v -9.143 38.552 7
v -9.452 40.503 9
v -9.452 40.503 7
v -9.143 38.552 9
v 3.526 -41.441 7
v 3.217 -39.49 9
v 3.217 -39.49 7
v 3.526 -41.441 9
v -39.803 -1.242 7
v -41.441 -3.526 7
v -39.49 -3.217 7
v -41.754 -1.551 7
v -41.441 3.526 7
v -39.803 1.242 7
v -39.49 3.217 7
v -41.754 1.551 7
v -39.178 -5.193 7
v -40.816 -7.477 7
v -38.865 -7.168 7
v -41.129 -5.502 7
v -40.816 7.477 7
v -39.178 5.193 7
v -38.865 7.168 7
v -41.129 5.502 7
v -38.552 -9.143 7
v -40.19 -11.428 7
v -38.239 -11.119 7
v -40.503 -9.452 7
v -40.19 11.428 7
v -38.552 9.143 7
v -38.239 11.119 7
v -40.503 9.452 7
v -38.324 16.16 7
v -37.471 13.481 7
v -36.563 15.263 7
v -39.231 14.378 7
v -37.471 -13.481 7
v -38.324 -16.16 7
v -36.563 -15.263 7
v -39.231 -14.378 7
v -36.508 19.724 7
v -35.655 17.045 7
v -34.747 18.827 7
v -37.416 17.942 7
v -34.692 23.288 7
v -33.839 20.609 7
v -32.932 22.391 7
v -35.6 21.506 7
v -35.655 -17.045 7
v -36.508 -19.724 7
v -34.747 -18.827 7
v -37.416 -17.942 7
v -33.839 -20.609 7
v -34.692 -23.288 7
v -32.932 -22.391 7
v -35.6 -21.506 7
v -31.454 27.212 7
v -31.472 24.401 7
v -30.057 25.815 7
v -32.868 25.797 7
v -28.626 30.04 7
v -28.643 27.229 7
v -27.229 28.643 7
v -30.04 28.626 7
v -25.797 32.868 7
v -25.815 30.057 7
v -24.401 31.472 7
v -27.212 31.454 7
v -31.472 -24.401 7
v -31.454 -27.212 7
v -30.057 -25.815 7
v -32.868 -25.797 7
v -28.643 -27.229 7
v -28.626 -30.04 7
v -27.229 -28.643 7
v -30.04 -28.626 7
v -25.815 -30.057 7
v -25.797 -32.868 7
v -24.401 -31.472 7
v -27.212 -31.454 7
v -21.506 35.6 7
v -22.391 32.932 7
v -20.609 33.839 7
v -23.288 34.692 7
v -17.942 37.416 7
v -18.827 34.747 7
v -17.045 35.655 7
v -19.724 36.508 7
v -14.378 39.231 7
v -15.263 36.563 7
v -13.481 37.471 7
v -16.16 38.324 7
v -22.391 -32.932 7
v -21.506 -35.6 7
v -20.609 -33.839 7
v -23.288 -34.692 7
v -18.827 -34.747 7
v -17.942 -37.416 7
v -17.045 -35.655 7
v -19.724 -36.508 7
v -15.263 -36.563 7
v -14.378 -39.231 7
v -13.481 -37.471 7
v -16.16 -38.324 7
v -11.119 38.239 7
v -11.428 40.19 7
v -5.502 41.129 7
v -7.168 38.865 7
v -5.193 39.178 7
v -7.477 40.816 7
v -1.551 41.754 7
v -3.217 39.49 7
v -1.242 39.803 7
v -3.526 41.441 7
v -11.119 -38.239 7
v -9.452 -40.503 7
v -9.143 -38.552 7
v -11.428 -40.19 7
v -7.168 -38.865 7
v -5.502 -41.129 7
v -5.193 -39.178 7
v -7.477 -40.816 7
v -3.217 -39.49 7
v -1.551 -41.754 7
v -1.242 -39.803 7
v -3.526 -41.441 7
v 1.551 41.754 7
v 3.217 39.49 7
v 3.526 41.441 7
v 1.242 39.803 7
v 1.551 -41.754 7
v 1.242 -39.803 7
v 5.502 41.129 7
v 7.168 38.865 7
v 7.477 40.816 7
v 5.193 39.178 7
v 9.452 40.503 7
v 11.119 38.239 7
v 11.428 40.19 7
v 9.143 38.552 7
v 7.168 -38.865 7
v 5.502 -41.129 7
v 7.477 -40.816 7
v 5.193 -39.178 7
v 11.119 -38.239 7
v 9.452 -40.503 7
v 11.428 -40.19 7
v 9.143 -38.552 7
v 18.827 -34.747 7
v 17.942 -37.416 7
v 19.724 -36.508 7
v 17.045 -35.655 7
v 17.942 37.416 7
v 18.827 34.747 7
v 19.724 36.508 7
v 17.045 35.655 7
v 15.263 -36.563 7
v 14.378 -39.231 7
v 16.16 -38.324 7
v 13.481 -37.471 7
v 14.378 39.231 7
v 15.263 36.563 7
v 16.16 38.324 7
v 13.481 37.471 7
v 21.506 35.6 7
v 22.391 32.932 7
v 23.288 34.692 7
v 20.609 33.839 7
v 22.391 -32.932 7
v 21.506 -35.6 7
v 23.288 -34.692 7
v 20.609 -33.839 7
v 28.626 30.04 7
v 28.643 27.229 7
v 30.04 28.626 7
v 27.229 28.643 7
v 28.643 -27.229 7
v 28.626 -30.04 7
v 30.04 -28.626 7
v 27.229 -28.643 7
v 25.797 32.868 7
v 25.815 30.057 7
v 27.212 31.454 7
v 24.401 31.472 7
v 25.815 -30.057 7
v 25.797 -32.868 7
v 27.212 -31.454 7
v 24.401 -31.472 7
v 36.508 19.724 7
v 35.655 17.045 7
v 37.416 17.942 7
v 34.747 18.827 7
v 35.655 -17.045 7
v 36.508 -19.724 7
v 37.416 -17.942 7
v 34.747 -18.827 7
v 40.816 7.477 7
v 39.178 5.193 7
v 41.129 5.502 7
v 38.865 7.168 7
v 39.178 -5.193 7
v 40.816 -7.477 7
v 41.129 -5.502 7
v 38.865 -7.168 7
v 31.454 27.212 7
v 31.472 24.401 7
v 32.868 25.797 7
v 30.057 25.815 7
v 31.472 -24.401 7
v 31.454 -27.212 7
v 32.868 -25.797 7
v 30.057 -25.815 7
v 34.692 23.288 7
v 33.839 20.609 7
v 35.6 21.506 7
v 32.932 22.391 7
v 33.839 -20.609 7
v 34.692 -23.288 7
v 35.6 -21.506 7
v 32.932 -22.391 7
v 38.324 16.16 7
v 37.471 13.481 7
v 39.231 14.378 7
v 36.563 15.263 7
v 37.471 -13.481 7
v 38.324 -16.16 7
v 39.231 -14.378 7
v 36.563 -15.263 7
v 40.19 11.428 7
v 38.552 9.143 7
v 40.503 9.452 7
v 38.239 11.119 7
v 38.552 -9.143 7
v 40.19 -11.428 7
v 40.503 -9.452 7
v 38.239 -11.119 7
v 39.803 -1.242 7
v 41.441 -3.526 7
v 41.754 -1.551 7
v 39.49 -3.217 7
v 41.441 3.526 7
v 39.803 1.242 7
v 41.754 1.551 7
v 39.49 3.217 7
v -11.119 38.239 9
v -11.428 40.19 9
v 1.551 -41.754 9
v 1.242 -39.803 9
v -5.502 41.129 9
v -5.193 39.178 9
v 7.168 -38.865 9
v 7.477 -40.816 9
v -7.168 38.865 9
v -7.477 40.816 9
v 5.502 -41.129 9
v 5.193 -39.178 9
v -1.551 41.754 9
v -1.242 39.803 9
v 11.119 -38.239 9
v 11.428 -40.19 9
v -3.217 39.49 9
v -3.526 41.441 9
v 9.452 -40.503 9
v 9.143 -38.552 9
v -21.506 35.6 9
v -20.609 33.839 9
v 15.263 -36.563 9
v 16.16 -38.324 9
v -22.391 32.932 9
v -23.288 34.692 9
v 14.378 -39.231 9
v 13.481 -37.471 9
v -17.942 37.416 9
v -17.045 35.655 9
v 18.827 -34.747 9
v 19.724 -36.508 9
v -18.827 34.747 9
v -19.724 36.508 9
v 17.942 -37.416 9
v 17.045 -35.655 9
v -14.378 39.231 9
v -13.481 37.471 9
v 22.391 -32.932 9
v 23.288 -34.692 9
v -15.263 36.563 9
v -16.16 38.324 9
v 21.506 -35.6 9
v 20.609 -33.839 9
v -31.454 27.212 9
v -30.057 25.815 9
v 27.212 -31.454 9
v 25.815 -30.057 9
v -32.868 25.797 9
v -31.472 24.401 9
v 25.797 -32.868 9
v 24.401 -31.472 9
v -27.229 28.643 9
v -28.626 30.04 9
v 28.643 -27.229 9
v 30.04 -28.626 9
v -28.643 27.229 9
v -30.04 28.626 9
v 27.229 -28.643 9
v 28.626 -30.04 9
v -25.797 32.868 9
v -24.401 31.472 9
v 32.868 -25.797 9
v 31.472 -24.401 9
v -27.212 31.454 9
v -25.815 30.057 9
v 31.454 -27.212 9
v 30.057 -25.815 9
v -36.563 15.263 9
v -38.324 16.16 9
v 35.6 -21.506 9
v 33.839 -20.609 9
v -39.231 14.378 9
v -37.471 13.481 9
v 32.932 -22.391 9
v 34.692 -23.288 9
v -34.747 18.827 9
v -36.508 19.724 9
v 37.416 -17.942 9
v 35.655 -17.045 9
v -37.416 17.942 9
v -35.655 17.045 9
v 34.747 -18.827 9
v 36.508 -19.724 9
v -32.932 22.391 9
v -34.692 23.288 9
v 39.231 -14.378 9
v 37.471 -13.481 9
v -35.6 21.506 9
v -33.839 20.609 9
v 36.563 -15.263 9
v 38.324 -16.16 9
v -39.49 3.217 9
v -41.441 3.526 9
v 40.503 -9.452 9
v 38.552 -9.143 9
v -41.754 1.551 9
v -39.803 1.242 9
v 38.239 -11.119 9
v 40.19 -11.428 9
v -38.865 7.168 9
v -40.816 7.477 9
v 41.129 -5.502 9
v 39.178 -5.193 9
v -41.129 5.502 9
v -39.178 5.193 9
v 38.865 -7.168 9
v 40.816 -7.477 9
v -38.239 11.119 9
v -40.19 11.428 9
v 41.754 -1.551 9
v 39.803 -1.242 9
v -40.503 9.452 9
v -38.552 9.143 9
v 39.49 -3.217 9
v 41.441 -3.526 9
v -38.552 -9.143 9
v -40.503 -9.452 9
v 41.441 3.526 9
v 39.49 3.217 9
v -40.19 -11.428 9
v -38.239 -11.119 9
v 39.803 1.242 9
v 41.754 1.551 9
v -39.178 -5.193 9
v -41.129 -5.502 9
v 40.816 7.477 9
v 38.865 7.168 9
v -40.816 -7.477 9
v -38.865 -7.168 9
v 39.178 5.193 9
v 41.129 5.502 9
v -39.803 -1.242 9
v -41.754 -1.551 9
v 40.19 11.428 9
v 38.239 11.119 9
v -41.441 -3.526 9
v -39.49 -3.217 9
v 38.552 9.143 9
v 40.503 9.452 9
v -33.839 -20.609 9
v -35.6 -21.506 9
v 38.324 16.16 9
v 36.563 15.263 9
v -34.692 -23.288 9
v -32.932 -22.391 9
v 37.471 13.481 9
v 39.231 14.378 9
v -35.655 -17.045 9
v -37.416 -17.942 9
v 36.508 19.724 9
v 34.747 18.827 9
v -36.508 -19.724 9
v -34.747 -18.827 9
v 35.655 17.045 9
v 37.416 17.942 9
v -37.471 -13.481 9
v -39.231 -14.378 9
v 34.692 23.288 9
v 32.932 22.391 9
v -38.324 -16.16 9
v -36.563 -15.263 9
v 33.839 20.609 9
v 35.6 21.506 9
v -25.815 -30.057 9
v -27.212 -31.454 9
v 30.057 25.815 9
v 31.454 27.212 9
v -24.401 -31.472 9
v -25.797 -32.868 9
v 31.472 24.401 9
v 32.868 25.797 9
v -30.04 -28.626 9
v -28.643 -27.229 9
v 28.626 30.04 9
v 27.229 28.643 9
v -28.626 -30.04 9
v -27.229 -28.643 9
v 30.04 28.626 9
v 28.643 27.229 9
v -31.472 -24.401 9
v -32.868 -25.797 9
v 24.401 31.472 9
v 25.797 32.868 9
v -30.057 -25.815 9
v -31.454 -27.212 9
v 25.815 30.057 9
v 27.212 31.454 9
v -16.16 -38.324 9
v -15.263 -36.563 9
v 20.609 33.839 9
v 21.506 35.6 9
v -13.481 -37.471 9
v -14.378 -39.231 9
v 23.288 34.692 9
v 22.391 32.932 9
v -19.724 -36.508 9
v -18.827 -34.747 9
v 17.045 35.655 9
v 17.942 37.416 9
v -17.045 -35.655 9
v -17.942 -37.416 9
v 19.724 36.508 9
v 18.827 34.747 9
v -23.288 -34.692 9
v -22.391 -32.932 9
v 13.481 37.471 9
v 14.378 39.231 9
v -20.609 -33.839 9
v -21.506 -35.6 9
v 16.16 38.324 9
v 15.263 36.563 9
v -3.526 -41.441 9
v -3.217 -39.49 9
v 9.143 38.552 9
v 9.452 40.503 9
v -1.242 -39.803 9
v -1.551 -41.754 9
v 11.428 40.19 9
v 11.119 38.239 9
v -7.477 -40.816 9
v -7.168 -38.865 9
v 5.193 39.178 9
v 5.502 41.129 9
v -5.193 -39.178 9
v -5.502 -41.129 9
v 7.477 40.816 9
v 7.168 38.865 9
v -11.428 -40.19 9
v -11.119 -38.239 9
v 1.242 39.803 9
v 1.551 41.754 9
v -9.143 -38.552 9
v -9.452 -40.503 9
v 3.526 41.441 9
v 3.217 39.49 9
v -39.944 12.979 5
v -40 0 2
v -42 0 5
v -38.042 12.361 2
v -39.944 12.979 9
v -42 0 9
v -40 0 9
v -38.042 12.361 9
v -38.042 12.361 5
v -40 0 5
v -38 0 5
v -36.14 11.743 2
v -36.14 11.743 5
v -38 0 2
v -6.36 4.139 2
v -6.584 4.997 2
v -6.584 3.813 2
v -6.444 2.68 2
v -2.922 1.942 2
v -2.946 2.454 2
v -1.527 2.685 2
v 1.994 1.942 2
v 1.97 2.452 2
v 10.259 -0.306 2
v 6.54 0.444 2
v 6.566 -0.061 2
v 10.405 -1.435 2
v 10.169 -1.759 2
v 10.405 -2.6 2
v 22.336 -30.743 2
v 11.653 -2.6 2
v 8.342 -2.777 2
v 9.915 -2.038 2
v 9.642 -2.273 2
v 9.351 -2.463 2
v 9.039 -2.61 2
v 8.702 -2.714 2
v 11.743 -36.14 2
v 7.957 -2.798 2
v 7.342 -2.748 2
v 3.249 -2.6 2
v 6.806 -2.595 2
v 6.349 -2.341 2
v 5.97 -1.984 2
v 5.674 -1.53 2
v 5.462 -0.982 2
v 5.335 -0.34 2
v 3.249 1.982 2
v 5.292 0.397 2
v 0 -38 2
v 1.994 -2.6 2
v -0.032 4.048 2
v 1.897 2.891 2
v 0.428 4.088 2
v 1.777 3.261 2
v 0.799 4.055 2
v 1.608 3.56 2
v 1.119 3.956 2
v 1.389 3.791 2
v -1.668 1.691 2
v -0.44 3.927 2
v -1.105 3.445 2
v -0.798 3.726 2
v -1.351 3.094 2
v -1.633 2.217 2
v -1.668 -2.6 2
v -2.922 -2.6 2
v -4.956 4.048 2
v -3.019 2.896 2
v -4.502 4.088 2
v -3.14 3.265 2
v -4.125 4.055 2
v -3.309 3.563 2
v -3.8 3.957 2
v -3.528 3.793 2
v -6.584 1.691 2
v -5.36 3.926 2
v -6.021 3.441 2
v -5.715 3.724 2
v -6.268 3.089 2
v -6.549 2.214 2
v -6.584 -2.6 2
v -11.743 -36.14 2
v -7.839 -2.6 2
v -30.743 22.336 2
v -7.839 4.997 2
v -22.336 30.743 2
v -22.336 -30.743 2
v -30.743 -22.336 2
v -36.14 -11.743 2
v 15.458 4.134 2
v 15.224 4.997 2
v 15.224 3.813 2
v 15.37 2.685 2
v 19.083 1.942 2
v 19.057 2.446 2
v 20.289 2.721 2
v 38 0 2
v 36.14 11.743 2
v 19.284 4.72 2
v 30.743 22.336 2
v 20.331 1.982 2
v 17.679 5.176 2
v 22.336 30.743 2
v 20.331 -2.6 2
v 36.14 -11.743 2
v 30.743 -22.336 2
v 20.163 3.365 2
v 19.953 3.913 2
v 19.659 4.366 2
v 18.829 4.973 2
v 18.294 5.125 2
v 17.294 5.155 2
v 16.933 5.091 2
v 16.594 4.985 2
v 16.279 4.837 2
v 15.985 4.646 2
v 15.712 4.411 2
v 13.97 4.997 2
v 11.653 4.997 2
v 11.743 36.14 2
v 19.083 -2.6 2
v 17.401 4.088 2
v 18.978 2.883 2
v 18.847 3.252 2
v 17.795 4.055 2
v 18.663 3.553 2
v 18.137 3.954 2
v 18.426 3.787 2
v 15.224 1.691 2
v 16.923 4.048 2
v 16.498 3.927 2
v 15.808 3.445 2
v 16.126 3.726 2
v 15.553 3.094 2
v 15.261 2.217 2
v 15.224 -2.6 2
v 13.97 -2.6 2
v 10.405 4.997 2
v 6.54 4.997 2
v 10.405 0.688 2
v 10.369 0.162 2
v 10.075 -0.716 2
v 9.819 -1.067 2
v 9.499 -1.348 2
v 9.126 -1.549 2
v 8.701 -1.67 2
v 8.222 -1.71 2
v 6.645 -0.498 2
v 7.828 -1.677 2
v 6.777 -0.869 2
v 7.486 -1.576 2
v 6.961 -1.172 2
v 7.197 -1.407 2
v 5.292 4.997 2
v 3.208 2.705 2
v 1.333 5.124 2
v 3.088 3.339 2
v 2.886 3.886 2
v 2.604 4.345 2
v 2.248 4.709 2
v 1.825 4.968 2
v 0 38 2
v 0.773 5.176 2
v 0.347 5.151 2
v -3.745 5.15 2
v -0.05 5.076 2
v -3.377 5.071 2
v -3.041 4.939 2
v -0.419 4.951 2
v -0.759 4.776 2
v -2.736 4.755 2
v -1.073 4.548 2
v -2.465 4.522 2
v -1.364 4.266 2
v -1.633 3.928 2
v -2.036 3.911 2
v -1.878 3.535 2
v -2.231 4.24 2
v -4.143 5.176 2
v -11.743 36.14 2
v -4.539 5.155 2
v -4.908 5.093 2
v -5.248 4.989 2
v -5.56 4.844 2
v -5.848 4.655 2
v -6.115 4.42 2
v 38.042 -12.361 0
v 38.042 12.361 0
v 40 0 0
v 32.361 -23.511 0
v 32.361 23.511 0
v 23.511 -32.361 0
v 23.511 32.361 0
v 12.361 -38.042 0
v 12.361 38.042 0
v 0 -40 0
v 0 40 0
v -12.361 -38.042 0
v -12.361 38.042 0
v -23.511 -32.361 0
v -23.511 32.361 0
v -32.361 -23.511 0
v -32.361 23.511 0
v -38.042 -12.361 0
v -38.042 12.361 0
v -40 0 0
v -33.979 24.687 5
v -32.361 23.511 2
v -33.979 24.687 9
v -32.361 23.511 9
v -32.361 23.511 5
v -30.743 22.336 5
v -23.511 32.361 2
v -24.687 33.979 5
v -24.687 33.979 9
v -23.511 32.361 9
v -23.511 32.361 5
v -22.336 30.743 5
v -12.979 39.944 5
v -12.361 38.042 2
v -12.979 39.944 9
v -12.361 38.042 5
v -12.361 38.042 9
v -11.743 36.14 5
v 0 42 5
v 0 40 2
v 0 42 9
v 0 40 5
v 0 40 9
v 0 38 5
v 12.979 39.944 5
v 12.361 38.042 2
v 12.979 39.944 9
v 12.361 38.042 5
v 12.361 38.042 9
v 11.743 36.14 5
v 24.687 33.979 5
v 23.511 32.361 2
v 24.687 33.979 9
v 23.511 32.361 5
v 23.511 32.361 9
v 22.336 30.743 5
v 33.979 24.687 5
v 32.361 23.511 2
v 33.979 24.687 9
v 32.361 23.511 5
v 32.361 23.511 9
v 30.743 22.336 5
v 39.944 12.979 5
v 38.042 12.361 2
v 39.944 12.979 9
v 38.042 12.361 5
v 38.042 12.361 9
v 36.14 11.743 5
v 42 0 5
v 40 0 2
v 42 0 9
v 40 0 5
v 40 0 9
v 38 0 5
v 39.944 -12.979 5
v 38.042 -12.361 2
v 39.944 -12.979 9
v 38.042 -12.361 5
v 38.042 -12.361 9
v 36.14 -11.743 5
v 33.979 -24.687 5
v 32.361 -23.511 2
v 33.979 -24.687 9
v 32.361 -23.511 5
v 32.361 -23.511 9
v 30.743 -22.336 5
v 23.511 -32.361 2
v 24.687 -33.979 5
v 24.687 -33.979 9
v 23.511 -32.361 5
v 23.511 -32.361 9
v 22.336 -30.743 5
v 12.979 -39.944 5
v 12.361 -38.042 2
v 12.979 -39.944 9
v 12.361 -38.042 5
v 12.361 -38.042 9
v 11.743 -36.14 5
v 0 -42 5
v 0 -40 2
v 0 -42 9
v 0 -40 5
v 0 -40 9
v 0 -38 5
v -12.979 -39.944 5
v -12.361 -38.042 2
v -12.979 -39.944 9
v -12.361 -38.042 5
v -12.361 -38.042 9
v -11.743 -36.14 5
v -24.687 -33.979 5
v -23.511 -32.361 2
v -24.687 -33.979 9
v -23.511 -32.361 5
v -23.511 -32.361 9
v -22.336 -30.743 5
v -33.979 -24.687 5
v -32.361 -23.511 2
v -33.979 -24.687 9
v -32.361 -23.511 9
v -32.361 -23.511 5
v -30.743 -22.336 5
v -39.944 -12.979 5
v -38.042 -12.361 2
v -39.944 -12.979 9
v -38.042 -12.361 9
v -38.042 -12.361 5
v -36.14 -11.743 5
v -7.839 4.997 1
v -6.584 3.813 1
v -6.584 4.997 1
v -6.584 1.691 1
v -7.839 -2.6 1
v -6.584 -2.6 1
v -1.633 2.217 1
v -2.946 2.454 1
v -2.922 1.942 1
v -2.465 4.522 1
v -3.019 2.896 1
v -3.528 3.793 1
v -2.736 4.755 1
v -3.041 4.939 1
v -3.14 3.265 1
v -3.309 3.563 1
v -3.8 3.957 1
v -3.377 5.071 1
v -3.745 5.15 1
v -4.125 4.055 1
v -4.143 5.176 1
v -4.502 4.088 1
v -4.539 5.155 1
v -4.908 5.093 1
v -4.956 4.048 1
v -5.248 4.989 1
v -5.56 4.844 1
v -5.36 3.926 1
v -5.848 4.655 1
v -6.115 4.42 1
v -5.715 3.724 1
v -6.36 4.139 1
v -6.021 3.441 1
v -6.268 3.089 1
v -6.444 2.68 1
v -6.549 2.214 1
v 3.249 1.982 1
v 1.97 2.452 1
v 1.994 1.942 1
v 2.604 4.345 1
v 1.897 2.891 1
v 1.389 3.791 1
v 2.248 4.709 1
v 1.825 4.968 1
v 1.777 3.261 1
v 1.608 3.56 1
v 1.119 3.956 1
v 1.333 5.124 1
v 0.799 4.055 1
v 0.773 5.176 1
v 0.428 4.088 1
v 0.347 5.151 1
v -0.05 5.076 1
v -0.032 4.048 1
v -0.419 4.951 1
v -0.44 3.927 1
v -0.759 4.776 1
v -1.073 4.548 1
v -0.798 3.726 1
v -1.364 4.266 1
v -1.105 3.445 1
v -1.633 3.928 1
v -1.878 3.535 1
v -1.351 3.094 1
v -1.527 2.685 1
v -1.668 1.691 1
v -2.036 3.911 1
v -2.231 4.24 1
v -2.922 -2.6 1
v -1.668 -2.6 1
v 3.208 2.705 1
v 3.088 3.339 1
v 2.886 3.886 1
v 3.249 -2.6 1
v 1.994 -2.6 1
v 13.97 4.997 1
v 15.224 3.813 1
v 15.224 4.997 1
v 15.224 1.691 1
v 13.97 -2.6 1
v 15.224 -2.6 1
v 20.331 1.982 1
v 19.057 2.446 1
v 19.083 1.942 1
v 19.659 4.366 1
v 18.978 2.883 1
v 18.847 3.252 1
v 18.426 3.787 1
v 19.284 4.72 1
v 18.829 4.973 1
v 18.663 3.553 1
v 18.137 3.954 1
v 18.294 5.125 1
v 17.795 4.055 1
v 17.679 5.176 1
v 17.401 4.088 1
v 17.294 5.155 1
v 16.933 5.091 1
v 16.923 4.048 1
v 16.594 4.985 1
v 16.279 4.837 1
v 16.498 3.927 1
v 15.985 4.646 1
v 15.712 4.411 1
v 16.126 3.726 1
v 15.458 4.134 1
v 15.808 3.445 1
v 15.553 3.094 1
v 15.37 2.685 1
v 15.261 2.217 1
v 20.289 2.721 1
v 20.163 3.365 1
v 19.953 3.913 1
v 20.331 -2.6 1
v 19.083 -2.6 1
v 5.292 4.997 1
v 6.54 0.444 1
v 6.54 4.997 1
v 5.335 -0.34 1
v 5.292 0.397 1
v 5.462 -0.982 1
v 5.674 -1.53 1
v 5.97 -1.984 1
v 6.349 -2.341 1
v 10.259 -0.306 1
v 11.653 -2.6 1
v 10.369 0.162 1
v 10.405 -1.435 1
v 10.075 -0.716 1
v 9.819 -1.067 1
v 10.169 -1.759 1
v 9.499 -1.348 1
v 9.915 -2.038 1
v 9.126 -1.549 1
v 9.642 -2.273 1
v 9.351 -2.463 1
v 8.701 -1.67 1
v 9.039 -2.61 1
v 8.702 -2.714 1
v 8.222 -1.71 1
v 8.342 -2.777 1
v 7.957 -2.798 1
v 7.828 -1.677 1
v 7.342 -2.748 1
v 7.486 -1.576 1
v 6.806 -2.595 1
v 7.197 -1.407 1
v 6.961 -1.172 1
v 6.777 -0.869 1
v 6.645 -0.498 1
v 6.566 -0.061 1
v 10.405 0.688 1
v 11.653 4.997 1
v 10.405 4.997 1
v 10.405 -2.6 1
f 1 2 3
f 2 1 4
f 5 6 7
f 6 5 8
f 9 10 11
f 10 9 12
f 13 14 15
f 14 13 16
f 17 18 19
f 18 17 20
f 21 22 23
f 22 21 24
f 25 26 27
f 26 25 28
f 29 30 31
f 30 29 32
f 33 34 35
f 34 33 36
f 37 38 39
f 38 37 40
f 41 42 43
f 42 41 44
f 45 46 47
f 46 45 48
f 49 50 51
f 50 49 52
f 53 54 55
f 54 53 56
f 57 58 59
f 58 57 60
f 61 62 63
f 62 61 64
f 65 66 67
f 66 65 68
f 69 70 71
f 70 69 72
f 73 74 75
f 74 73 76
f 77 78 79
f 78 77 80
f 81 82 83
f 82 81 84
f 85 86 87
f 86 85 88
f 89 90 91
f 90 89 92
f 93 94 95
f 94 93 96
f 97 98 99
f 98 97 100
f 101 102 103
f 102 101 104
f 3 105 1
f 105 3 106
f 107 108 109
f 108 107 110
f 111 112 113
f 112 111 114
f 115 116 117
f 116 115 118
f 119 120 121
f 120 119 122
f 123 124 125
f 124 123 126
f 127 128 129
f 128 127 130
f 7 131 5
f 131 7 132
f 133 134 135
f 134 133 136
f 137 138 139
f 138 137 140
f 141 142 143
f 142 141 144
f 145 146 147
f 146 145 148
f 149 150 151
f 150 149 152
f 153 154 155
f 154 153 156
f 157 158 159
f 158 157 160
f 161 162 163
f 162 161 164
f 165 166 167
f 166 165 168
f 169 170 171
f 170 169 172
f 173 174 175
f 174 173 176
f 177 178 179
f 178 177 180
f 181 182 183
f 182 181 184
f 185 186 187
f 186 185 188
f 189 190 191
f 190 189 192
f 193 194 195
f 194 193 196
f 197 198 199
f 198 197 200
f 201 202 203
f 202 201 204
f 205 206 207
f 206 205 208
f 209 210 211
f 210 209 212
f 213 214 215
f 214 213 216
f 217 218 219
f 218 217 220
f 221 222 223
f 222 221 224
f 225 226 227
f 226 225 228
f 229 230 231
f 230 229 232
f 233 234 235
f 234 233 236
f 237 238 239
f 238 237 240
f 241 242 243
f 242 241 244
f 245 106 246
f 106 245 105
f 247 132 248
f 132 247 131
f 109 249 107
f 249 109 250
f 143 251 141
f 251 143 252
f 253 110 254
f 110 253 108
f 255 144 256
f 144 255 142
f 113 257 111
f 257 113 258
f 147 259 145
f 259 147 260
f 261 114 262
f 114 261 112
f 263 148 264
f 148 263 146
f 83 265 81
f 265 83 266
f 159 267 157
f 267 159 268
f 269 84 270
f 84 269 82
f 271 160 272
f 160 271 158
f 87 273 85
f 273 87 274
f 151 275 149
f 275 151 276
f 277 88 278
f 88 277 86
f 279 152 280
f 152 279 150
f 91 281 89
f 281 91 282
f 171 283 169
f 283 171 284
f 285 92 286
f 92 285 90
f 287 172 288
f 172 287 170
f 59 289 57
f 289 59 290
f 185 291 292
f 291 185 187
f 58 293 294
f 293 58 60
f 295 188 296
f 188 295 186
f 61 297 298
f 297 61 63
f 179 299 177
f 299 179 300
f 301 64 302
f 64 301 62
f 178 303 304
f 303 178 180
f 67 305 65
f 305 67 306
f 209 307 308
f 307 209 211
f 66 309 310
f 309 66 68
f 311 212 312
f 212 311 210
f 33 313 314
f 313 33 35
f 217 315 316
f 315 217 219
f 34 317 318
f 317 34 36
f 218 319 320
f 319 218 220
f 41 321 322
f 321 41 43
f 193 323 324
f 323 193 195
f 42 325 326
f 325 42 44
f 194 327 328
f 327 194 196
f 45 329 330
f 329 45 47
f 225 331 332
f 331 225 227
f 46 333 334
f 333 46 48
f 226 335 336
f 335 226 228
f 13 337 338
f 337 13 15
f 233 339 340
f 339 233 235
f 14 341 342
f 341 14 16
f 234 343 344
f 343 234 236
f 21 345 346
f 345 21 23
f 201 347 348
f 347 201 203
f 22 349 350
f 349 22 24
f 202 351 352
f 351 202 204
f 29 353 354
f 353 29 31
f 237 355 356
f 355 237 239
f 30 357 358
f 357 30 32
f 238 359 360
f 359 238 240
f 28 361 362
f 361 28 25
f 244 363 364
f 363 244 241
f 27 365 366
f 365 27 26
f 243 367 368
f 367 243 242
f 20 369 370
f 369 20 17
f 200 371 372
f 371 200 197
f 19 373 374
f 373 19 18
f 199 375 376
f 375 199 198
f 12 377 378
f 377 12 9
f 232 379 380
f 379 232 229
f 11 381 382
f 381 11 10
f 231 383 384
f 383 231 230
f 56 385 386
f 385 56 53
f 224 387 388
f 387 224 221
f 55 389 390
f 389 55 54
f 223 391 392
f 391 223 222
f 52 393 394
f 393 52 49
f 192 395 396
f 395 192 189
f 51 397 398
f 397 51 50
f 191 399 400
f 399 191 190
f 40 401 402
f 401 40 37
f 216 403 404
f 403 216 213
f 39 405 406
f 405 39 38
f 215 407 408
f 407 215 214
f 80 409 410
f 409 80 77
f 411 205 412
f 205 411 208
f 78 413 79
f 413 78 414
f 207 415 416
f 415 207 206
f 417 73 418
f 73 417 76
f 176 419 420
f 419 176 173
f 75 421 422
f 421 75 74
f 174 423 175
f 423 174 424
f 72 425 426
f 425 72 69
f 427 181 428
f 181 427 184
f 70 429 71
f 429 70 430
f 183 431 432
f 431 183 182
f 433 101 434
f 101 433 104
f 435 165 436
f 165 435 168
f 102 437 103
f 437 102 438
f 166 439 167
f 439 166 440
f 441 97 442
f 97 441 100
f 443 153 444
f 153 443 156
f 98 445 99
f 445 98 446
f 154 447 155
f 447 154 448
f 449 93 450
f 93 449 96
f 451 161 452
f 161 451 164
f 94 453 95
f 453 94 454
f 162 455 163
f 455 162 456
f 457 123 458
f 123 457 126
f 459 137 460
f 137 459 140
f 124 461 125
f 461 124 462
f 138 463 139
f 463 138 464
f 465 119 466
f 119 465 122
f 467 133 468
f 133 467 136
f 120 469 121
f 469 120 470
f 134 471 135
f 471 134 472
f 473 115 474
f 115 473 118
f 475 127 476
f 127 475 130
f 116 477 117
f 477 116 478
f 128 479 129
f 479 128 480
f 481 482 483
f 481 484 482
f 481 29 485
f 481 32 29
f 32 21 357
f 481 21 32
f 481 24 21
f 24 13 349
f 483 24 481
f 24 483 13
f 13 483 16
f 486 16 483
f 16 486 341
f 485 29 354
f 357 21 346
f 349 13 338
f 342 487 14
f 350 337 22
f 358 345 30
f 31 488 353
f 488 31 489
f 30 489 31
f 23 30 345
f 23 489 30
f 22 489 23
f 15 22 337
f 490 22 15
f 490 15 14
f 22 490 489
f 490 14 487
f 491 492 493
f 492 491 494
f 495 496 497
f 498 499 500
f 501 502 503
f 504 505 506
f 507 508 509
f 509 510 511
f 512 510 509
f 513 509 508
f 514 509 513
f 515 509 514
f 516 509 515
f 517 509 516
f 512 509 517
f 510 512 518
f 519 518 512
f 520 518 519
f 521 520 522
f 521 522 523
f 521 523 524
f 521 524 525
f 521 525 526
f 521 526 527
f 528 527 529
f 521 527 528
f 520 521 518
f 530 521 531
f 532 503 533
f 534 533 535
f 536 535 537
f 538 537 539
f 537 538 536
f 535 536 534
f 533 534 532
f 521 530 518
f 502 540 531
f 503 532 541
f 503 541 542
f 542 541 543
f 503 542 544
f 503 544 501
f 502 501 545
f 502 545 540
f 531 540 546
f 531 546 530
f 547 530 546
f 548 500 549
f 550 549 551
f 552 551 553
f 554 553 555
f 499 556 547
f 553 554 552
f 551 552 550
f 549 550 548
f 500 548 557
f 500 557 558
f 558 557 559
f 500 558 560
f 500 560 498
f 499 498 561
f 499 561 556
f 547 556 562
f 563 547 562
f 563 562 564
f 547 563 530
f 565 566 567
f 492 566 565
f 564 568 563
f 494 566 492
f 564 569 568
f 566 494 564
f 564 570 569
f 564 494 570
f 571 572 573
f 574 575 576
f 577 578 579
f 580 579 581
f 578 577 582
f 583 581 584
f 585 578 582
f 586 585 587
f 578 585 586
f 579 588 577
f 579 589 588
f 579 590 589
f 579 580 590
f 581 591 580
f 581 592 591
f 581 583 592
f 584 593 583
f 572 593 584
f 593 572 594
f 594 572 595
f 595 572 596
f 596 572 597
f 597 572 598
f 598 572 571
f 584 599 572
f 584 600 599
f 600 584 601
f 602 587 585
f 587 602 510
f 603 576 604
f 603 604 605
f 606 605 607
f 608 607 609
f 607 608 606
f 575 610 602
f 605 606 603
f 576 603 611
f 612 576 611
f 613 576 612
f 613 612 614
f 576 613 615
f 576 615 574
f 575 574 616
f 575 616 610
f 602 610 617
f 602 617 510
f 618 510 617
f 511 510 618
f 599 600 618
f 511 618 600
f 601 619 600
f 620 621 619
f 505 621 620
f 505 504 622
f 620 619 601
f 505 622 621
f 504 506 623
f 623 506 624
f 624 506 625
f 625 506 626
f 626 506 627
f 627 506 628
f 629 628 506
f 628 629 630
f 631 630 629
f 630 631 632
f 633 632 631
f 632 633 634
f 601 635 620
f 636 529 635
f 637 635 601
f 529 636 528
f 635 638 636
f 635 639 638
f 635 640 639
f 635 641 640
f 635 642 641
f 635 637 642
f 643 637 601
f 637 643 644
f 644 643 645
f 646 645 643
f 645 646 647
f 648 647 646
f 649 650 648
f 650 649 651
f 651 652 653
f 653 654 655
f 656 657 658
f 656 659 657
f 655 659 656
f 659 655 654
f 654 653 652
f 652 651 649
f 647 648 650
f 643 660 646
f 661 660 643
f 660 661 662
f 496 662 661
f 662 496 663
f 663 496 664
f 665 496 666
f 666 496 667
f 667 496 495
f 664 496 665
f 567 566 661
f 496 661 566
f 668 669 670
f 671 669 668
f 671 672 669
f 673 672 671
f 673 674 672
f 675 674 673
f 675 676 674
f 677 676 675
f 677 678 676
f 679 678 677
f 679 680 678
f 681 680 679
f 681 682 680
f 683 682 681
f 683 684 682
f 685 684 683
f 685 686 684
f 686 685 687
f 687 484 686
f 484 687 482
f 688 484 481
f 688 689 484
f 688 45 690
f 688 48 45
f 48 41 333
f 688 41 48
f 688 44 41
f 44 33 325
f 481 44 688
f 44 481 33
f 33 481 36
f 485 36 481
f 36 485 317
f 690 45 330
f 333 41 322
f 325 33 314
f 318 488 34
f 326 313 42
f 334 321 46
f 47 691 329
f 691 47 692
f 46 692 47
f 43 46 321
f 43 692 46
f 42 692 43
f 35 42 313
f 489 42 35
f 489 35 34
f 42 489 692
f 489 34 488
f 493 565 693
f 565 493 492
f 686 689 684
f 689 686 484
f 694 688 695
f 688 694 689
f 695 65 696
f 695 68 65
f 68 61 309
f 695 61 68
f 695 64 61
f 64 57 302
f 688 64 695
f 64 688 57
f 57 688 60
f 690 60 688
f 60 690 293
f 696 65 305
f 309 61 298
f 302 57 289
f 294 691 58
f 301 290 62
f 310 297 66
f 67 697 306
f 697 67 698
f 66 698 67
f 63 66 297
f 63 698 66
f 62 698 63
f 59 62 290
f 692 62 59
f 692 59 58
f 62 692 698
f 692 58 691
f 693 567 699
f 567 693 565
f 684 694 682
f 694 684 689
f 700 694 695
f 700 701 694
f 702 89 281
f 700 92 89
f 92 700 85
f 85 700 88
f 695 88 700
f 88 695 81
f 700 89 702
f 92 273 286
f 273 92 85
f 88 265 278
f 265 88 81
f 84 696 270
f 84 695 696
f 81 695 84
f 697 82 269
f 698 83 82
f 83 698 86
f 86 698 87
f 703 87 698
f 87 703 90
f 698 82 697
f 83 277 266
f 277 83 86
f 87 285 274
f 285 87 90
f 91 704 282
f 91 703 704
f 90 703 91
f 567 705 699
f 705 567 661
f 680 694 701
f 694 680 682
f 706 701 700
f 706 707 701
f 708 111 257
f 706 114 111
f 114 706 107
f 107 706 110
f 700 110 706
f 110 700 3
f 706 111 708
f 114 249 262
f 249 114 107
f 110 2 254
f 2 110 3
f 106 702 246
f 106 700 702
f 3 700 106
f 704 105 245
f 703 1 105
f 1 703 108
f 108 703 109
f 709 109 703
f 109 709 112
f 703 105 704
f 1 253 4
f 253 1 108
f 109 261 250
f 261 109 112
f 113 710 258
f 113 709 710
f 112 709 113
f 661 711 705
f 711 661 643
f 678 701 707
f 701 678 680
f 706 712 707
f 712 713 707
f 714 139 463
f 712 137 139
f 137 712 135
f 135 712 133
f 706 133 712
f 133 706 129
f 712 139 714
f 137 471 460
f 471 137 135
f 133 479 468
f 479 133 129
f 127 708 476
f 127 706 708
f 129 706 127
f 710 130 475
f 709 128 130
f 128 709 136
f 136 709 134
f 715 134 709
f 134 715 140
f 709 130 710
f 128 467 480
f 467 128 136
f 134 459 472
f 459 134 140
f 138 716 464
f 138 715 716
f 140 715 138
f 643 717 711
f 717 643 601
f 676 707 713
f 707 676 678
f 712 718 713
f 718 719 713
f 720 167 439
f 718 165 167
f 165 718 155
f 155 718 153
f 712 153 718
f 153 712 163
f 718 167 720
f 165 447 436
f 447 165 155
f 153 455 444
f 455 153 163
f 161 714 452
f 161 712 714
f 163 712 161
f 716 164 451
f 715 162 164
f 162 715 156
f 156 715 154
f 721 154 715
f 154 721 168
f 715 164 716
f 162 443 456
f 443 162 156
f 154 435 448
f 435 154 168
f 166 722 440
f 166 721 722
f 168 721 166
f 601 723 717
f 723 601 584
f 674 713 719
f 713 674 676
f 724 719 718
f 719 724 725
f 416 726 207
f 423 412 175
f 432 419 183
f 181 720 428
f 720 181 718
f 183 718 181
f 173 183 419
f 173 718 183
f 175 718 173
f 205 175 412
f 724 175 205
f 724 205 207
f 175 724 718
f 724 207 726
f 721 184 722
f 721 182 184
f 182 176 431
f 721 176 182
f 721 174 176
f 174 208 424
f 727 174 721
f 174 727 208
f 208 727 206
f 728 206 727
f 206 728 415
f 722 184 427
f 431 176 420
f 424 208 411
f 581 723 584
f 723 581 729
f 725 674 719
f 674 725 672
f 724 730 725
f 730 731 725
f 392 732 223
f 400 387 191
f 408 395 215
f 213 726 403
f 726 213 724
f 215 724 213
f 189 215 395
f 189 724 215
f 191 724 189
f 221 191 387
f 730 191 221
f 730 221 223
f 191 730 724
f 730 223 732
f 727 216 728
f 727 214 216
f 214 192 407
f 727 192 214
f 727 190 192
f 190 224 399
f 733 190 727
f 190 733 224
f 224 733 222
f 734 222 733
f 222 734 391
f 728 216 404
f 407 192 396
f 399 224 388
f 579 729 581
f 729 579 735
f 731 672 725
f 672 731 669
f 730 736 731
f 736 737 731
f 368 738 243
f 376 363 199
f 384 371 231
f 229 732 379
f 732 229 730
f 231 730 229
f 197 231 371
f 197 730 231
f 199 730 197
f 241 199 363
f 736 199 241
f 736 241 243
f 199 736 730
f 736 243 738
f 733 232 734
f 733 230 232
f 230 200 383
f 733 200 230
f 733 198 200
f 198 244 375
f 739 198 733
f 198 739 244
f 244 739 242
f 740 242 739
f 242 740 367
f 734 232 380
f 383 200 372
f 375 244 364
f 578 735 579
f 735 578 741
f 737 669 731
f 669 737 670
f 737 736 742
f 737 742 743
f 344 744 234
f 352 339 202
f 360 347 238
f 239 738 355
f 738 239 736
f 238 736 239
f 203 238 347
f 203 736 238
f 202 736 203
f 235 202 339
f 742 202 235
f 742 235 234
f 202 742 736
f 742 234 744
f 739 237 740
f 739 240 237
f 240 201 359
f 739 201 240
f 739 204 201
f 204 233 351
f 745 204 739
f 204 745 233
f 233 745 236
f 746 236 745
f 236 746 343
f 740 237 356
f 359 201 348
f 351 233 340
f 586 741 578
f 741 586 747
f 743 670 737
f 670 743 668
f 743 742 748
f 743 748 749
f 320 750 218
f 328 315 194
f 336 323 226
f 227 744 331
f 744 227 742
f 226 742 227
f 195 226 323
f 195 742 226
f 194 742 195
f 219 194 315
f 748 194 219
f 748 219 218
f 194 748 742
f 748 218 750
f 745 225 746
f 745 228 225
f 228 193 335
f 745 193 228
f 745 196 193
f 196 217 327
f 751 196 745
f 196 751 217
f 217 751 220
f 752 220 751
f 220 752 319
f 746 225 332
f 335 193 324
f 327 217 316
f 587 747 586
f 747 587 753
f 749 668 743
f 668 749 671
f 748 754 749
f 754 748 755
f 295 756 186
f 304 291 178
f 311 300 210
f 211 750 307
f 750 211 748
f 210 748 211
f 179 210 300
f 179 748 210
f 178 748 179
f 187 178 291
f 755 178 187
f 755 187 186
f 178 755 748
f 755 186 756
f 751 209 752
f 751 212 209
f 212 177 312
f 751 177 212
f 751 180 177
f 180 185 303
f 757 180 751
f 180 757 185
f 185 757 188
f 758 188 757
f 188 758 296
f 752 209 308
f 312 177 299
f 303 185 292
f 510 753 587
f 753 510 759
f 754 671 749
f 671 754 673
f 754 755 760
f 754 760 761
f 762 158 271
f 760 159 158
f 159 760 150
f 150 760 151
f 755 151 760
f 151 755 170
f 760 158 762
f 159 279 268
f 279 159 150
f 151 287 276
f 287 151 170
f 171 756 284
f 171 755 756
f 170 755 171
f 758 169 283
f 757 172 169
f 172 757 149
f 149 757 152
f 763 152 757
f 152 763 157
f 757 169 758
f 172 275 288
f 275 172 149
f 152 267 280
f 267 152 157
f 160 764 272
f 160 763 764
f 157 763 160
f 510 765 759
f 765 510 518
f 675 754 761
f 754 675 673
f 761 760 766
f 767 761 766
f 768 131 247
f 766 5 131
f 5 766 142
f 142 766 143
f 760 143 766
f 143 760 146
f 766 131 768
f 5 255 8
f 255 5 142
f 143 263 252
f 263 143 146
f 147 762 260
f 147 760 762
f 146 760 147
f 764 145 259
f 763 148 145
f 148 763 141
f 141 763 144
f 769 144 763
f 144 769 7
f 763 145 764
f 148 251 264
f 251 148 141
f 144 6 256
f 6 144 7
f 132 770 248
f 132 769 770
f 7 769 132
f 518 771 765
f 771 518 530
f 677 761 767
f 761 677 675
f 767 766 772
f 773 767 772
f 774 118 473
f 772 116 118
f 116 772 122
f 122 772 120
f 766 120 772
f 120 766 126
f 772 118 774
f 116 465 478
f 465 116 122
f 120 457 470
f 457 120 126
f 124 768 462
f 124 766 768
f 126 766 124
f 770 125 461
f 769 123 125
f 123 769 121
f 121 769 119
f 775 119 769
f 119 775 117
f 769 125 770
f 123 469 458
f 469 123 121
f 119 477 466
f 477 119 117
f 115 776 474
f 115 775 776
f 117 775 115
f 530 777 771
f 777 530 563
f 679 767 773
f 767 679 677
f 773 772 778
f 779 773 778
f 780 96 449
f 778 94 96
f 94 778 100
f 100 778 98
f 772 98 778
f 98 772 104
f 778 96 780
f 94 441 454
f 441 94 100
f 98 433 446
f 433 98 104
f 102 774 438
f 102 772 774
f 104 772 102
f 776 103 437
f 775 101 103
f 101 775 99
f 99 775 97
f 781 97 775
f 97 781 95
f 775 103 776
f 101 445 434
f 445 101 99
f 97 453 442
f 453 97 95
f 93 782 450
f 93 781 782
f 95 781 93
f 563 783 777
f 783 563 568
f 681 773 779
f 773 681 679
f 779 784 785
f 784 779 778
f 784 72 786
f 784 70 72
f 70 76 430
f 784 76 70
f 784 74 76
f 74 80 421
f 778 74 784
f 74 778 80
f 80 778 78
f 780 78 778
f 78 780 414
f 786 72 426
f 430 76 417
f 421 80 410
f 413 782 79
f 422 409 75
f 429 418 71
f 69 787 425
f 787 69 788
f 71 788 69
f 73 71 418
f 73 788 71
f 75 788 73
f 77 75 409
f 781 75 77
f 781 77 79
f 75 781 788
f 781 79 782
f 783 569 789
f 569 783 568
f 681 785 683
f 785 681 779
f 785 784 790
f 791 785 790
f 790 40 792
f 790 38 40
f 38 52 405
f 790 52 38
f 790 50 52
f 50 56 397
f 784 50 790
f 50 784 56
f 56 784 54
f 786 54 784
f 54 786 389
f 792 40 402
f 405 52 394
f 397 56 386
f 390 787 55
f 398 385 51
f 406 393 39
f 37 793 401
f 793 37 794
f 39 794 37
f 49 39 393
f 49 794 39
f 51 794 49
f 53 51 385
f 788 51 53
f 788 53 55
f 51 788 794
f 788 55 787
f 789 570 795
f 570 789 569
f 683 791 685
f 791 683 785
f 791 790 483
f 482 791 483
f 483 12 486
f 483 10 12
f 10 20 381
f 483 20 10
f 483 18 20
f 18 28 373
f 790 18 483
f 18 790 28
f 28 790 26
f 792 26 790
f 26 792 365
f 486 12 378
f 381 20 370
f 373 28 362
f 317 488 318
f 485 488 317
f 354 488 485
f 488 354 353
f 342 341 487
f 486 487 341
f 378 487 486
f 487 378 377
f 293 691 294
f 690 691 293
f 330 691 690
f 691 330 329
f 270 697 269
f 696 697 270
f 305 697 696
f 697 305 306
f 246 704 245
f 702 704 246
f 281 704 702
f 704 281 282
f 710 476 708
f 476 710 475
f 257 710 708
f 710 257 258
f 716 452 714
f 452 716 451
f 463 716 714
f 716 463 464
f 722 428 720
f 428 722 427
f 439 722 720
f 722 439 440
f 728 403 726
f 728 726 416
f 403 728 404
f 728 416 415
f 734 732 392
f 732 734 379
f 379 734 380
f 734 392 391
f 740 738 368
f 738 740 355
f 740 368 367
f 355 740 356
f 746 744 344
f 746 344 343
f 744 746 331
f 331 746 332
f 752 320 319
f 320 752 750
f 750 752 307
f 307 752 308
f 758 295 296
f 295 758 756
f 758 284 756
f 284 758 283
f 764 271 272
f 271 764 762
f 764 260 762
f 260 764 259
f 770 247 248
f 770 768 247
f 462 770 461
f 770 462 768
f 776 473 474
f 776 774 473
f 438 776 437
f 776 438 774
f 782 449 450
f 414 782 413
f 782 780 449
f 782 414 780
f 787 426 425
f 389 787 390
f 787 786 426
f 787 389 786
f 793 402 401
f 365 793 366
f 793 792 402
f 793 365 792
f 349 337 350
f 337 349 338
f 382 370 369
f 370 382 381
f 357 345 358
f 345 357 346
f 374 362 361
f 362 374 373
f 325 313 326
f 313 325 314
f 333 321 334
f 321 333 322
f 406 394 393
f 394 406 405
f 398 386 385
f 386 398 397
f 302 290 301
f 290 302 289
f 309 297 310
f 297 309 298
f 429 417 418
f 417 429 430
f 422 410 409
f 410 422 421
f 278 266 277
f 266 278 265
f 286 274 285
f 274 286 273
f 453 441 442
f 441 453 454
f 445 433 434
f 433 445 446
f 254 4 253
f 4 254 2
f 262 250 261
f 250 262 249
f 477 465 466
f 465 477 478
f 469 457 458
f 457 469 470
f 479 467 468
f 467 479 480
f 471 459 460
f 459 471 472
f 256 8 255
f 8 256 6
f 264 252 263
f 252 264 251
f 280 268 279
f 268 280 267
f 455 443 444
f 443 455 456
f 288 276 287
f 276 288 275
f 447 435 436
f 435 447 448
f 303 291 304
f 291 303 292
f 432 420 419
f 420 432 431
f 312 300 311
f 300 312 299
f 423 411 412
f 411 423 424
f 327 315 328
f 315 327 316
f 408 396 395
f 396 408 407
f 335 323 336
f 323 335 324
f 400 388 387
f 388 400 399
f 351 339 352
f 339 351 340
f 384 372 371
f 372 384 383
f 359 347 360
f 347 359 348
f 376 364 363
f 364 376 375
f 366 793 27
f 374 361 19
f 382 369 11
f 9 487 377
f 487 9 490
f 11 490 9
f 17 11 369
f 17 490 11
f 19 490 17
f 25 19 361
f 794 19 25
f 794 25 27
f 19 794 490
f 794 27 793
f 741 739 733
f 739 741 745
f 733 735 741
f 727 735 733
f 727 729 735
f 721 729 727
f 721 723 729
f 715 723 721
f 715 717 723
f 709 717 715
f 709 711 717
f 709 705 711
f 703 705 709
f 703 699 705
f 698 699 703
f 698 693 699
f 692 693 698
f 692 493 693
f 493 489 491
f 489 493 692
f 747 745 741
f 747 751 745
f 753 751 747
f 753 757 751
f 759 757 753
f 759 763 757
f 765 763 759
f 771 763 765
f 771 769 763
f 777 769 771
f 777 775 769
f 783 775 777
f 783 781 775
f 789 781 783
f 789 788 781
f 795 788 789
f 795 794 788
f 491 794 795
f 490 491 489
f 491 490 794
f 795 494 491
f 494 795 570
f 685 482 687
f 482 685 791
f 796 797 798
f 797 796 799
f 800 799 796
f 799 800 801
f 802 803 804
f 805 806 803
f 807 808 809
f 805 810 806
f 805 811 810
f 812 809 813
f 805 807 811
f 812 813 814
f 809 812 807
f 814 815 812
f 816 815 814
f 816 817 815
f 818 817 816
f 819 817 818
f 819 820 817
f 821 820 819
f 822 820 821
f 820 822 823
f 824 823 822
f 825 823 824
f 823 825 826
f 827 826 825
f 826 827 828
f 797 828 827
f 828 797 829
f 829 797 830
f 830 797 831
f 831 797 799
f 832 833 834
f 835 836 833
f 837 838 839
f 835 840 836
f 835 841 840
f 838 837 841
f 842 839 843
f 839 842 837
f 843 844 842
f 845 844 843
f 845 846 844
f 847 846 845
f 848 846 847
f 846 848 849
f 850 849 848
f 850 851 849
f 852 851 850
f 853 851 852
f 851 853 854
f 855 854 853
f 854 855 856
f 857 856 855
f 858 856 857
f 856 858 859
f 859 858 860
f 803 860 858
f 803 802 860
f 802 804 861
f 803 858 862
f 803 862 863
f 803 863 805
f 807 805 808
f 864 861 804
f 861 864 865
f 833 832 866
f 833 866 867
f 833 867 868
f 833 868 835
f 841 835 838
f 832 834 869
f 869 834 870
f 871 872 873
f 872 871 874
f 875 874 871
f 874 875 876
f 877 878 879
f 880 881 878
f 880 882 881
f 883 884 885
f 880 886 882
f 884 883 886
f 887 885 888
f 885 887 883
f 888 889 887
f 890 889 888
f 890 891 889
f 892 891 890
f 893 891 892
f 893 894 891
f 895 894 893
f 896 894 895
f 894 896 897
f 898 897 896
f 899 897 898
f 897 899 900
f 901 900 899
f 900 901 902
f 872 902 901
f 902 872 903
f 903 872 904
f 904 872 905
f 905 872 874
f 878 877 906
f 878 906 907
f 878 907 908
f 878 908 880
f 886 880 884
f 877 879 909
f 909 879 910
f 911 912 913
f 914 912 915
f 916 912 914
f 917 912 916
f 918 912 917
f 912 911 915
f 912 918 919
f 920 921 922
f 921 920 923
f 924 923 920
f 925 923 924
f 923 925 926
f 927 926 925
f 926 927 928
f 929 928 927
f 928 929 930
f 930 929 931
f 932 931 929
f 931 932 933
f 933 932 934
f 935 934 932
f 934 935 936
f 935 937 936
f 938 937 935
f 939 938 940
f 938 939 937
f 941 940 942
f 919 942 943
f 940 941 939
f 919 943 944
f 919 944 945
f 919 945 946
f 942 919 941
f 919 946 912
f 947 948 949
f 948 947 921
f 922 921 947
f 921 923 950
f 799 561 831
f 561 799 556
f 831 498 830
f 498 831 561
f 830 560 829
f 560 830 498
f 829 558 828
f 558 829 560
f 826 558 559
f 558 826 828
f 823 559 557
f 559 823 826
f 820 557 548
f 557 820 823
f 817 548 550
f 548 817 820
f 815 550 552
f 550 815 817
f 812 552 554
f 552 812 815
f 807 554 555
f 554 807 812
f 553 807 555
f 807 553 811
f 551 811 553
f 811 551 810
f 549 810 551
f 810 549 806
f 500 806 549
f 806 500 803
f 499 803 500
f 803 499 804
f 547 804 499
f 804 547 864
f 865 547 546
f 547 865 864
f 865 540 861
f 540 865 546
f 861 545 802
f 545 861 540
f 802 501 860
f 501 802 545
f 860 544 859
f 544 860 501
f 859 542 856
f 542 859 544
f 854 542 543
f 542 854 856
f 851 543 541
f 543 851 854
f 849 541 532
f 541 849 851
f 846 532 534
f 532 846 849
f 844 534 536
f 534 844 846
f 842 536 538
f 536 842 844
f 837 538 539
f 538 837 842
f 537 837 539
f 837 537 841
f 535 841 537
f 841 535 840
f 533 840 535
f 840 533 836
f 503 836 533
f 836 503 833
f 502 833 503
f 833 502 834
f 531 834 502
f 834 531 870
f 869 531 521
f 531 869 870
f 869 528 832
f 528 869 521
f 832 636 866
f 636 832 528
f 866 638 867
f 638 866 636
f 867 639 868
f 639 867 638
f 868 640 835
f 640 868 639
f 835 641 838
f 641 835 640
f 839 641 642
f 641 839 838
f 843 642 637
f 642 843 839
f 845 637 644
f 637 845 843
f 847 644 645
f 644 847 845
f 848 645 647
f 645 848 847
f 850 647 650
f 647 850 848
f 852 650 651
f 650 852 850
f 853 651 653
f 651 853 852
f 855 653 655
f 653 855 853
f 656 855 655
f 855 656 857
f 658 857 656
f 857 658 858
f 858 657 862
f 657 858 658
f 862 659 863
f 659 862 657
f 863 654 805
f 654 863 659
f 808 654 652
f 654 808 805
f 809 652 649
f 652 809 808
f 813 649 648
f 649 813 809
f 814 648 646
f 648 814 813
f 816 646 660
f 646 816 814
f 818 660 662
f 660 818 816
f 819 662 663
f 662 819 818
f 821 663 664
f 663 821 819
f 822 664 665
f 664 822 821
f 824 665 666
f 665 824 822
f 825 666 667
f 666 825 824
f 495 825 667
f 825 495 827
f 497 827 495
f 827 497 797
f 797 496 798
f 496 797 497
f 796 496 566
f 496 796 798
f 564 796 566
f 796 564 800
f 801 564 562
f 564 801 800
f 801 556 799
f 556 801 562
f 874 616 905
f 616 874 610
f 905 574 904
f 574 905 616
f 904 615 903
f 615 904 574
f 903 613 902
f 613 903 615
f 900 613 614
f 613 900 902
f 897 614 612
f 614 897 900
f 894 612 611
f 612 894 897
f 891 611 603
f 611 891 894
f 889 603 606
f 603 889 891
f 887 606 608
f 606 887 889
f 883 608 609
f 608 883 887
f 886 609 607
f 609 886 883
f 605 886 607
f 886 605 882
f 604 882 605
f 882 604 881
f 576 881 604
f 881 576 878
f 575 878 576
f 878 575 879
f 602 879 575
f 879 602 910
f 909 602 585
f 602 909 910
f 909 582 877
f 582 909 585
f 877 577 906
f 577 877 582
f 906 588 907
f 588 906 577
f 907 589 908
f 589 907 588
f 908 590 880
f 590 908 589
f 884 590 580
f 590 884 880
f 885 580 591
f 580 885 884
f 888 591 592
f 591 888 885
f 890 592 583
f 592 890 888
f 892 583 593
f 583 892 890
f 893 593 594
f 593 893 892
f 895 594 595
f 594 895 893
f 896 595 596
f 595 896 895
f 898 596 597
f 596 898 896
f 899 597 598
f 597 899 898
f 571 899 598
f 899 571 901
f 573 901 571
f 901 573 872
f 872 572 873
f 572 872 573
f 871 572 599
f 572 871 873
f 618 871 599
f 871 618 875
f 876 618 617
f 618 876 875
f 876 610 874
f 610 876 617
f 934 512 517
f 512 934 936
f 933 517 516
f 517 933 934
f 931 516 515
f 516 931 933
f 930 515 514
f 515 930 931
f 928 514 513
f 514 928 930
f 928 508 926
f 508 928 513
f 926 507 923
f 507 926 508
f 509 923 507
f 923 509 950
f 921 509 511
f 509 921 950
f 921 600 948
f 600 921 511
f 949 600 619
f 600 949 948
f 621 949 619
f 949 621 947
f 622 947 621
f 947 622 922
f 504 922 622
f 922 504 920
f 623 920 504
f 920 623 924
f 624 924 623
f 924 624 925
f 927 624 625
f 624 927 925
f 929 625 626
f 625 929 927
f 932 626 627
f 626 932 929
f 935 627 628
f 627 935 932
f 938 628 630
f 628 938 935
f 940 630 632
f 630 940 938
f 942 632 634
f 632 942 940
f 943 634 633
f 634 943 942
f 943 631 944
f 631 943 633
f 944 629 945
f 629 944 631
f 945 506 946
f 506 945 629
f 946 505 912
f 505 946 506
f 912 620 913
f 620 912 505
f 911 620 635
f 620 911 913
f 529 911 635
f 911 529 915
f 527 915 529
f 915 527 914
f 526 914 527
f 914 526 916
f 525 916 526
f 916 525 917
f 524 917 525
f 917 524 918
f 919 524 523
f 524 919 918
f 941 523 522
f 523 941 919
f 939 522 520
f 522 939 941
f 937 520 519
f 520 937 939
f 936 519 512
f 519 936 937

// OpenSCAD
// TODO:
// - Add the taper to the base that exists in coaster-stack.scad, this allows it top stack smoothly without getting stuck.
// - Either fix the radius to fit the inlay-rings or make a new one to fit this.
// - Decorative arches in the overhang slope
// - Tiny loop-holes? Maybe too small.


base_radius = 40;
base_thickness = 2;
wall_thickness = 4;
merlon_h = 2;
crenel_h = 2;

crenel_w = 2; // If you change this number straight_cren_set() will need adjusting
wall_height = merlon_h + crenel_h;
wall_overhang_w = 2;
wall_overhang_h = 3;
insert_radius = 38;


wall_segments = 20; // If you change this number straight_cren_set() and offset will need adjusting

module base_poly(){
    polygon(points = [
        [0,0], 
        [base_radius, 0], 
        [base_radius, base_thickness], 
        [base_radius + wall_overhang_w, base_thickness + wall_overhang_h],
        [base_radius + wall_overhang_w, base_thickness + wall_overhang_h + wall_height],
        [base_radius , base_thickness + wall_overhang_h + wall_height],
        [base_radius , base_thickness + wall_overhang_h ],
        [insert_radius, base_thickness + wall_overhang_h ],
        [insert_radius, base_thickness ],
        [0, base_thickness],
        ]);
}

module base(){
    rotate ([0,0,0]) rotate_extrude($fn=wall_segments) base_poly();
}

module crenel_cut() {
    step = 360/wall_segments;
    offset = step/2;
    module cren_bar() {
        translate([-(crenel_w/2), -base_radius-wall_overhang_w-1,base_thickness + wall_overhang_h+ (wall_height-merlon_h)]) cube([crenel_w,(base_radius+wall_overhang_w + 1)*2, merlon_h + 1]);
    }
    module straight_cren_set() {
        translate([-crenel_w-crenel_w,0,0]) cren_bar();
        translate([0,0,0]) cren_bar();
        translate([crenel_w+crenel_w,0,0]) cren_bar();
    }
    union() {   
        for (i = [1:(wall_segments/2)]) {
            rotate([0,0,(step*i)-offset]) straight_cren_set();
        }
    }
}

module stamp(){
    translate([-9.1,-2.6,base_thickness -1 ]) linear_extrude(3) text("mun", size=10, font="ProggyClean Nerd Font");
}

module crenelated_base() {
    difference() {
        base();
        crenel_cut();
        stamp();
    }
}


//base_poly();
//crenel_cut();
//stamp();
crenelated_base();
